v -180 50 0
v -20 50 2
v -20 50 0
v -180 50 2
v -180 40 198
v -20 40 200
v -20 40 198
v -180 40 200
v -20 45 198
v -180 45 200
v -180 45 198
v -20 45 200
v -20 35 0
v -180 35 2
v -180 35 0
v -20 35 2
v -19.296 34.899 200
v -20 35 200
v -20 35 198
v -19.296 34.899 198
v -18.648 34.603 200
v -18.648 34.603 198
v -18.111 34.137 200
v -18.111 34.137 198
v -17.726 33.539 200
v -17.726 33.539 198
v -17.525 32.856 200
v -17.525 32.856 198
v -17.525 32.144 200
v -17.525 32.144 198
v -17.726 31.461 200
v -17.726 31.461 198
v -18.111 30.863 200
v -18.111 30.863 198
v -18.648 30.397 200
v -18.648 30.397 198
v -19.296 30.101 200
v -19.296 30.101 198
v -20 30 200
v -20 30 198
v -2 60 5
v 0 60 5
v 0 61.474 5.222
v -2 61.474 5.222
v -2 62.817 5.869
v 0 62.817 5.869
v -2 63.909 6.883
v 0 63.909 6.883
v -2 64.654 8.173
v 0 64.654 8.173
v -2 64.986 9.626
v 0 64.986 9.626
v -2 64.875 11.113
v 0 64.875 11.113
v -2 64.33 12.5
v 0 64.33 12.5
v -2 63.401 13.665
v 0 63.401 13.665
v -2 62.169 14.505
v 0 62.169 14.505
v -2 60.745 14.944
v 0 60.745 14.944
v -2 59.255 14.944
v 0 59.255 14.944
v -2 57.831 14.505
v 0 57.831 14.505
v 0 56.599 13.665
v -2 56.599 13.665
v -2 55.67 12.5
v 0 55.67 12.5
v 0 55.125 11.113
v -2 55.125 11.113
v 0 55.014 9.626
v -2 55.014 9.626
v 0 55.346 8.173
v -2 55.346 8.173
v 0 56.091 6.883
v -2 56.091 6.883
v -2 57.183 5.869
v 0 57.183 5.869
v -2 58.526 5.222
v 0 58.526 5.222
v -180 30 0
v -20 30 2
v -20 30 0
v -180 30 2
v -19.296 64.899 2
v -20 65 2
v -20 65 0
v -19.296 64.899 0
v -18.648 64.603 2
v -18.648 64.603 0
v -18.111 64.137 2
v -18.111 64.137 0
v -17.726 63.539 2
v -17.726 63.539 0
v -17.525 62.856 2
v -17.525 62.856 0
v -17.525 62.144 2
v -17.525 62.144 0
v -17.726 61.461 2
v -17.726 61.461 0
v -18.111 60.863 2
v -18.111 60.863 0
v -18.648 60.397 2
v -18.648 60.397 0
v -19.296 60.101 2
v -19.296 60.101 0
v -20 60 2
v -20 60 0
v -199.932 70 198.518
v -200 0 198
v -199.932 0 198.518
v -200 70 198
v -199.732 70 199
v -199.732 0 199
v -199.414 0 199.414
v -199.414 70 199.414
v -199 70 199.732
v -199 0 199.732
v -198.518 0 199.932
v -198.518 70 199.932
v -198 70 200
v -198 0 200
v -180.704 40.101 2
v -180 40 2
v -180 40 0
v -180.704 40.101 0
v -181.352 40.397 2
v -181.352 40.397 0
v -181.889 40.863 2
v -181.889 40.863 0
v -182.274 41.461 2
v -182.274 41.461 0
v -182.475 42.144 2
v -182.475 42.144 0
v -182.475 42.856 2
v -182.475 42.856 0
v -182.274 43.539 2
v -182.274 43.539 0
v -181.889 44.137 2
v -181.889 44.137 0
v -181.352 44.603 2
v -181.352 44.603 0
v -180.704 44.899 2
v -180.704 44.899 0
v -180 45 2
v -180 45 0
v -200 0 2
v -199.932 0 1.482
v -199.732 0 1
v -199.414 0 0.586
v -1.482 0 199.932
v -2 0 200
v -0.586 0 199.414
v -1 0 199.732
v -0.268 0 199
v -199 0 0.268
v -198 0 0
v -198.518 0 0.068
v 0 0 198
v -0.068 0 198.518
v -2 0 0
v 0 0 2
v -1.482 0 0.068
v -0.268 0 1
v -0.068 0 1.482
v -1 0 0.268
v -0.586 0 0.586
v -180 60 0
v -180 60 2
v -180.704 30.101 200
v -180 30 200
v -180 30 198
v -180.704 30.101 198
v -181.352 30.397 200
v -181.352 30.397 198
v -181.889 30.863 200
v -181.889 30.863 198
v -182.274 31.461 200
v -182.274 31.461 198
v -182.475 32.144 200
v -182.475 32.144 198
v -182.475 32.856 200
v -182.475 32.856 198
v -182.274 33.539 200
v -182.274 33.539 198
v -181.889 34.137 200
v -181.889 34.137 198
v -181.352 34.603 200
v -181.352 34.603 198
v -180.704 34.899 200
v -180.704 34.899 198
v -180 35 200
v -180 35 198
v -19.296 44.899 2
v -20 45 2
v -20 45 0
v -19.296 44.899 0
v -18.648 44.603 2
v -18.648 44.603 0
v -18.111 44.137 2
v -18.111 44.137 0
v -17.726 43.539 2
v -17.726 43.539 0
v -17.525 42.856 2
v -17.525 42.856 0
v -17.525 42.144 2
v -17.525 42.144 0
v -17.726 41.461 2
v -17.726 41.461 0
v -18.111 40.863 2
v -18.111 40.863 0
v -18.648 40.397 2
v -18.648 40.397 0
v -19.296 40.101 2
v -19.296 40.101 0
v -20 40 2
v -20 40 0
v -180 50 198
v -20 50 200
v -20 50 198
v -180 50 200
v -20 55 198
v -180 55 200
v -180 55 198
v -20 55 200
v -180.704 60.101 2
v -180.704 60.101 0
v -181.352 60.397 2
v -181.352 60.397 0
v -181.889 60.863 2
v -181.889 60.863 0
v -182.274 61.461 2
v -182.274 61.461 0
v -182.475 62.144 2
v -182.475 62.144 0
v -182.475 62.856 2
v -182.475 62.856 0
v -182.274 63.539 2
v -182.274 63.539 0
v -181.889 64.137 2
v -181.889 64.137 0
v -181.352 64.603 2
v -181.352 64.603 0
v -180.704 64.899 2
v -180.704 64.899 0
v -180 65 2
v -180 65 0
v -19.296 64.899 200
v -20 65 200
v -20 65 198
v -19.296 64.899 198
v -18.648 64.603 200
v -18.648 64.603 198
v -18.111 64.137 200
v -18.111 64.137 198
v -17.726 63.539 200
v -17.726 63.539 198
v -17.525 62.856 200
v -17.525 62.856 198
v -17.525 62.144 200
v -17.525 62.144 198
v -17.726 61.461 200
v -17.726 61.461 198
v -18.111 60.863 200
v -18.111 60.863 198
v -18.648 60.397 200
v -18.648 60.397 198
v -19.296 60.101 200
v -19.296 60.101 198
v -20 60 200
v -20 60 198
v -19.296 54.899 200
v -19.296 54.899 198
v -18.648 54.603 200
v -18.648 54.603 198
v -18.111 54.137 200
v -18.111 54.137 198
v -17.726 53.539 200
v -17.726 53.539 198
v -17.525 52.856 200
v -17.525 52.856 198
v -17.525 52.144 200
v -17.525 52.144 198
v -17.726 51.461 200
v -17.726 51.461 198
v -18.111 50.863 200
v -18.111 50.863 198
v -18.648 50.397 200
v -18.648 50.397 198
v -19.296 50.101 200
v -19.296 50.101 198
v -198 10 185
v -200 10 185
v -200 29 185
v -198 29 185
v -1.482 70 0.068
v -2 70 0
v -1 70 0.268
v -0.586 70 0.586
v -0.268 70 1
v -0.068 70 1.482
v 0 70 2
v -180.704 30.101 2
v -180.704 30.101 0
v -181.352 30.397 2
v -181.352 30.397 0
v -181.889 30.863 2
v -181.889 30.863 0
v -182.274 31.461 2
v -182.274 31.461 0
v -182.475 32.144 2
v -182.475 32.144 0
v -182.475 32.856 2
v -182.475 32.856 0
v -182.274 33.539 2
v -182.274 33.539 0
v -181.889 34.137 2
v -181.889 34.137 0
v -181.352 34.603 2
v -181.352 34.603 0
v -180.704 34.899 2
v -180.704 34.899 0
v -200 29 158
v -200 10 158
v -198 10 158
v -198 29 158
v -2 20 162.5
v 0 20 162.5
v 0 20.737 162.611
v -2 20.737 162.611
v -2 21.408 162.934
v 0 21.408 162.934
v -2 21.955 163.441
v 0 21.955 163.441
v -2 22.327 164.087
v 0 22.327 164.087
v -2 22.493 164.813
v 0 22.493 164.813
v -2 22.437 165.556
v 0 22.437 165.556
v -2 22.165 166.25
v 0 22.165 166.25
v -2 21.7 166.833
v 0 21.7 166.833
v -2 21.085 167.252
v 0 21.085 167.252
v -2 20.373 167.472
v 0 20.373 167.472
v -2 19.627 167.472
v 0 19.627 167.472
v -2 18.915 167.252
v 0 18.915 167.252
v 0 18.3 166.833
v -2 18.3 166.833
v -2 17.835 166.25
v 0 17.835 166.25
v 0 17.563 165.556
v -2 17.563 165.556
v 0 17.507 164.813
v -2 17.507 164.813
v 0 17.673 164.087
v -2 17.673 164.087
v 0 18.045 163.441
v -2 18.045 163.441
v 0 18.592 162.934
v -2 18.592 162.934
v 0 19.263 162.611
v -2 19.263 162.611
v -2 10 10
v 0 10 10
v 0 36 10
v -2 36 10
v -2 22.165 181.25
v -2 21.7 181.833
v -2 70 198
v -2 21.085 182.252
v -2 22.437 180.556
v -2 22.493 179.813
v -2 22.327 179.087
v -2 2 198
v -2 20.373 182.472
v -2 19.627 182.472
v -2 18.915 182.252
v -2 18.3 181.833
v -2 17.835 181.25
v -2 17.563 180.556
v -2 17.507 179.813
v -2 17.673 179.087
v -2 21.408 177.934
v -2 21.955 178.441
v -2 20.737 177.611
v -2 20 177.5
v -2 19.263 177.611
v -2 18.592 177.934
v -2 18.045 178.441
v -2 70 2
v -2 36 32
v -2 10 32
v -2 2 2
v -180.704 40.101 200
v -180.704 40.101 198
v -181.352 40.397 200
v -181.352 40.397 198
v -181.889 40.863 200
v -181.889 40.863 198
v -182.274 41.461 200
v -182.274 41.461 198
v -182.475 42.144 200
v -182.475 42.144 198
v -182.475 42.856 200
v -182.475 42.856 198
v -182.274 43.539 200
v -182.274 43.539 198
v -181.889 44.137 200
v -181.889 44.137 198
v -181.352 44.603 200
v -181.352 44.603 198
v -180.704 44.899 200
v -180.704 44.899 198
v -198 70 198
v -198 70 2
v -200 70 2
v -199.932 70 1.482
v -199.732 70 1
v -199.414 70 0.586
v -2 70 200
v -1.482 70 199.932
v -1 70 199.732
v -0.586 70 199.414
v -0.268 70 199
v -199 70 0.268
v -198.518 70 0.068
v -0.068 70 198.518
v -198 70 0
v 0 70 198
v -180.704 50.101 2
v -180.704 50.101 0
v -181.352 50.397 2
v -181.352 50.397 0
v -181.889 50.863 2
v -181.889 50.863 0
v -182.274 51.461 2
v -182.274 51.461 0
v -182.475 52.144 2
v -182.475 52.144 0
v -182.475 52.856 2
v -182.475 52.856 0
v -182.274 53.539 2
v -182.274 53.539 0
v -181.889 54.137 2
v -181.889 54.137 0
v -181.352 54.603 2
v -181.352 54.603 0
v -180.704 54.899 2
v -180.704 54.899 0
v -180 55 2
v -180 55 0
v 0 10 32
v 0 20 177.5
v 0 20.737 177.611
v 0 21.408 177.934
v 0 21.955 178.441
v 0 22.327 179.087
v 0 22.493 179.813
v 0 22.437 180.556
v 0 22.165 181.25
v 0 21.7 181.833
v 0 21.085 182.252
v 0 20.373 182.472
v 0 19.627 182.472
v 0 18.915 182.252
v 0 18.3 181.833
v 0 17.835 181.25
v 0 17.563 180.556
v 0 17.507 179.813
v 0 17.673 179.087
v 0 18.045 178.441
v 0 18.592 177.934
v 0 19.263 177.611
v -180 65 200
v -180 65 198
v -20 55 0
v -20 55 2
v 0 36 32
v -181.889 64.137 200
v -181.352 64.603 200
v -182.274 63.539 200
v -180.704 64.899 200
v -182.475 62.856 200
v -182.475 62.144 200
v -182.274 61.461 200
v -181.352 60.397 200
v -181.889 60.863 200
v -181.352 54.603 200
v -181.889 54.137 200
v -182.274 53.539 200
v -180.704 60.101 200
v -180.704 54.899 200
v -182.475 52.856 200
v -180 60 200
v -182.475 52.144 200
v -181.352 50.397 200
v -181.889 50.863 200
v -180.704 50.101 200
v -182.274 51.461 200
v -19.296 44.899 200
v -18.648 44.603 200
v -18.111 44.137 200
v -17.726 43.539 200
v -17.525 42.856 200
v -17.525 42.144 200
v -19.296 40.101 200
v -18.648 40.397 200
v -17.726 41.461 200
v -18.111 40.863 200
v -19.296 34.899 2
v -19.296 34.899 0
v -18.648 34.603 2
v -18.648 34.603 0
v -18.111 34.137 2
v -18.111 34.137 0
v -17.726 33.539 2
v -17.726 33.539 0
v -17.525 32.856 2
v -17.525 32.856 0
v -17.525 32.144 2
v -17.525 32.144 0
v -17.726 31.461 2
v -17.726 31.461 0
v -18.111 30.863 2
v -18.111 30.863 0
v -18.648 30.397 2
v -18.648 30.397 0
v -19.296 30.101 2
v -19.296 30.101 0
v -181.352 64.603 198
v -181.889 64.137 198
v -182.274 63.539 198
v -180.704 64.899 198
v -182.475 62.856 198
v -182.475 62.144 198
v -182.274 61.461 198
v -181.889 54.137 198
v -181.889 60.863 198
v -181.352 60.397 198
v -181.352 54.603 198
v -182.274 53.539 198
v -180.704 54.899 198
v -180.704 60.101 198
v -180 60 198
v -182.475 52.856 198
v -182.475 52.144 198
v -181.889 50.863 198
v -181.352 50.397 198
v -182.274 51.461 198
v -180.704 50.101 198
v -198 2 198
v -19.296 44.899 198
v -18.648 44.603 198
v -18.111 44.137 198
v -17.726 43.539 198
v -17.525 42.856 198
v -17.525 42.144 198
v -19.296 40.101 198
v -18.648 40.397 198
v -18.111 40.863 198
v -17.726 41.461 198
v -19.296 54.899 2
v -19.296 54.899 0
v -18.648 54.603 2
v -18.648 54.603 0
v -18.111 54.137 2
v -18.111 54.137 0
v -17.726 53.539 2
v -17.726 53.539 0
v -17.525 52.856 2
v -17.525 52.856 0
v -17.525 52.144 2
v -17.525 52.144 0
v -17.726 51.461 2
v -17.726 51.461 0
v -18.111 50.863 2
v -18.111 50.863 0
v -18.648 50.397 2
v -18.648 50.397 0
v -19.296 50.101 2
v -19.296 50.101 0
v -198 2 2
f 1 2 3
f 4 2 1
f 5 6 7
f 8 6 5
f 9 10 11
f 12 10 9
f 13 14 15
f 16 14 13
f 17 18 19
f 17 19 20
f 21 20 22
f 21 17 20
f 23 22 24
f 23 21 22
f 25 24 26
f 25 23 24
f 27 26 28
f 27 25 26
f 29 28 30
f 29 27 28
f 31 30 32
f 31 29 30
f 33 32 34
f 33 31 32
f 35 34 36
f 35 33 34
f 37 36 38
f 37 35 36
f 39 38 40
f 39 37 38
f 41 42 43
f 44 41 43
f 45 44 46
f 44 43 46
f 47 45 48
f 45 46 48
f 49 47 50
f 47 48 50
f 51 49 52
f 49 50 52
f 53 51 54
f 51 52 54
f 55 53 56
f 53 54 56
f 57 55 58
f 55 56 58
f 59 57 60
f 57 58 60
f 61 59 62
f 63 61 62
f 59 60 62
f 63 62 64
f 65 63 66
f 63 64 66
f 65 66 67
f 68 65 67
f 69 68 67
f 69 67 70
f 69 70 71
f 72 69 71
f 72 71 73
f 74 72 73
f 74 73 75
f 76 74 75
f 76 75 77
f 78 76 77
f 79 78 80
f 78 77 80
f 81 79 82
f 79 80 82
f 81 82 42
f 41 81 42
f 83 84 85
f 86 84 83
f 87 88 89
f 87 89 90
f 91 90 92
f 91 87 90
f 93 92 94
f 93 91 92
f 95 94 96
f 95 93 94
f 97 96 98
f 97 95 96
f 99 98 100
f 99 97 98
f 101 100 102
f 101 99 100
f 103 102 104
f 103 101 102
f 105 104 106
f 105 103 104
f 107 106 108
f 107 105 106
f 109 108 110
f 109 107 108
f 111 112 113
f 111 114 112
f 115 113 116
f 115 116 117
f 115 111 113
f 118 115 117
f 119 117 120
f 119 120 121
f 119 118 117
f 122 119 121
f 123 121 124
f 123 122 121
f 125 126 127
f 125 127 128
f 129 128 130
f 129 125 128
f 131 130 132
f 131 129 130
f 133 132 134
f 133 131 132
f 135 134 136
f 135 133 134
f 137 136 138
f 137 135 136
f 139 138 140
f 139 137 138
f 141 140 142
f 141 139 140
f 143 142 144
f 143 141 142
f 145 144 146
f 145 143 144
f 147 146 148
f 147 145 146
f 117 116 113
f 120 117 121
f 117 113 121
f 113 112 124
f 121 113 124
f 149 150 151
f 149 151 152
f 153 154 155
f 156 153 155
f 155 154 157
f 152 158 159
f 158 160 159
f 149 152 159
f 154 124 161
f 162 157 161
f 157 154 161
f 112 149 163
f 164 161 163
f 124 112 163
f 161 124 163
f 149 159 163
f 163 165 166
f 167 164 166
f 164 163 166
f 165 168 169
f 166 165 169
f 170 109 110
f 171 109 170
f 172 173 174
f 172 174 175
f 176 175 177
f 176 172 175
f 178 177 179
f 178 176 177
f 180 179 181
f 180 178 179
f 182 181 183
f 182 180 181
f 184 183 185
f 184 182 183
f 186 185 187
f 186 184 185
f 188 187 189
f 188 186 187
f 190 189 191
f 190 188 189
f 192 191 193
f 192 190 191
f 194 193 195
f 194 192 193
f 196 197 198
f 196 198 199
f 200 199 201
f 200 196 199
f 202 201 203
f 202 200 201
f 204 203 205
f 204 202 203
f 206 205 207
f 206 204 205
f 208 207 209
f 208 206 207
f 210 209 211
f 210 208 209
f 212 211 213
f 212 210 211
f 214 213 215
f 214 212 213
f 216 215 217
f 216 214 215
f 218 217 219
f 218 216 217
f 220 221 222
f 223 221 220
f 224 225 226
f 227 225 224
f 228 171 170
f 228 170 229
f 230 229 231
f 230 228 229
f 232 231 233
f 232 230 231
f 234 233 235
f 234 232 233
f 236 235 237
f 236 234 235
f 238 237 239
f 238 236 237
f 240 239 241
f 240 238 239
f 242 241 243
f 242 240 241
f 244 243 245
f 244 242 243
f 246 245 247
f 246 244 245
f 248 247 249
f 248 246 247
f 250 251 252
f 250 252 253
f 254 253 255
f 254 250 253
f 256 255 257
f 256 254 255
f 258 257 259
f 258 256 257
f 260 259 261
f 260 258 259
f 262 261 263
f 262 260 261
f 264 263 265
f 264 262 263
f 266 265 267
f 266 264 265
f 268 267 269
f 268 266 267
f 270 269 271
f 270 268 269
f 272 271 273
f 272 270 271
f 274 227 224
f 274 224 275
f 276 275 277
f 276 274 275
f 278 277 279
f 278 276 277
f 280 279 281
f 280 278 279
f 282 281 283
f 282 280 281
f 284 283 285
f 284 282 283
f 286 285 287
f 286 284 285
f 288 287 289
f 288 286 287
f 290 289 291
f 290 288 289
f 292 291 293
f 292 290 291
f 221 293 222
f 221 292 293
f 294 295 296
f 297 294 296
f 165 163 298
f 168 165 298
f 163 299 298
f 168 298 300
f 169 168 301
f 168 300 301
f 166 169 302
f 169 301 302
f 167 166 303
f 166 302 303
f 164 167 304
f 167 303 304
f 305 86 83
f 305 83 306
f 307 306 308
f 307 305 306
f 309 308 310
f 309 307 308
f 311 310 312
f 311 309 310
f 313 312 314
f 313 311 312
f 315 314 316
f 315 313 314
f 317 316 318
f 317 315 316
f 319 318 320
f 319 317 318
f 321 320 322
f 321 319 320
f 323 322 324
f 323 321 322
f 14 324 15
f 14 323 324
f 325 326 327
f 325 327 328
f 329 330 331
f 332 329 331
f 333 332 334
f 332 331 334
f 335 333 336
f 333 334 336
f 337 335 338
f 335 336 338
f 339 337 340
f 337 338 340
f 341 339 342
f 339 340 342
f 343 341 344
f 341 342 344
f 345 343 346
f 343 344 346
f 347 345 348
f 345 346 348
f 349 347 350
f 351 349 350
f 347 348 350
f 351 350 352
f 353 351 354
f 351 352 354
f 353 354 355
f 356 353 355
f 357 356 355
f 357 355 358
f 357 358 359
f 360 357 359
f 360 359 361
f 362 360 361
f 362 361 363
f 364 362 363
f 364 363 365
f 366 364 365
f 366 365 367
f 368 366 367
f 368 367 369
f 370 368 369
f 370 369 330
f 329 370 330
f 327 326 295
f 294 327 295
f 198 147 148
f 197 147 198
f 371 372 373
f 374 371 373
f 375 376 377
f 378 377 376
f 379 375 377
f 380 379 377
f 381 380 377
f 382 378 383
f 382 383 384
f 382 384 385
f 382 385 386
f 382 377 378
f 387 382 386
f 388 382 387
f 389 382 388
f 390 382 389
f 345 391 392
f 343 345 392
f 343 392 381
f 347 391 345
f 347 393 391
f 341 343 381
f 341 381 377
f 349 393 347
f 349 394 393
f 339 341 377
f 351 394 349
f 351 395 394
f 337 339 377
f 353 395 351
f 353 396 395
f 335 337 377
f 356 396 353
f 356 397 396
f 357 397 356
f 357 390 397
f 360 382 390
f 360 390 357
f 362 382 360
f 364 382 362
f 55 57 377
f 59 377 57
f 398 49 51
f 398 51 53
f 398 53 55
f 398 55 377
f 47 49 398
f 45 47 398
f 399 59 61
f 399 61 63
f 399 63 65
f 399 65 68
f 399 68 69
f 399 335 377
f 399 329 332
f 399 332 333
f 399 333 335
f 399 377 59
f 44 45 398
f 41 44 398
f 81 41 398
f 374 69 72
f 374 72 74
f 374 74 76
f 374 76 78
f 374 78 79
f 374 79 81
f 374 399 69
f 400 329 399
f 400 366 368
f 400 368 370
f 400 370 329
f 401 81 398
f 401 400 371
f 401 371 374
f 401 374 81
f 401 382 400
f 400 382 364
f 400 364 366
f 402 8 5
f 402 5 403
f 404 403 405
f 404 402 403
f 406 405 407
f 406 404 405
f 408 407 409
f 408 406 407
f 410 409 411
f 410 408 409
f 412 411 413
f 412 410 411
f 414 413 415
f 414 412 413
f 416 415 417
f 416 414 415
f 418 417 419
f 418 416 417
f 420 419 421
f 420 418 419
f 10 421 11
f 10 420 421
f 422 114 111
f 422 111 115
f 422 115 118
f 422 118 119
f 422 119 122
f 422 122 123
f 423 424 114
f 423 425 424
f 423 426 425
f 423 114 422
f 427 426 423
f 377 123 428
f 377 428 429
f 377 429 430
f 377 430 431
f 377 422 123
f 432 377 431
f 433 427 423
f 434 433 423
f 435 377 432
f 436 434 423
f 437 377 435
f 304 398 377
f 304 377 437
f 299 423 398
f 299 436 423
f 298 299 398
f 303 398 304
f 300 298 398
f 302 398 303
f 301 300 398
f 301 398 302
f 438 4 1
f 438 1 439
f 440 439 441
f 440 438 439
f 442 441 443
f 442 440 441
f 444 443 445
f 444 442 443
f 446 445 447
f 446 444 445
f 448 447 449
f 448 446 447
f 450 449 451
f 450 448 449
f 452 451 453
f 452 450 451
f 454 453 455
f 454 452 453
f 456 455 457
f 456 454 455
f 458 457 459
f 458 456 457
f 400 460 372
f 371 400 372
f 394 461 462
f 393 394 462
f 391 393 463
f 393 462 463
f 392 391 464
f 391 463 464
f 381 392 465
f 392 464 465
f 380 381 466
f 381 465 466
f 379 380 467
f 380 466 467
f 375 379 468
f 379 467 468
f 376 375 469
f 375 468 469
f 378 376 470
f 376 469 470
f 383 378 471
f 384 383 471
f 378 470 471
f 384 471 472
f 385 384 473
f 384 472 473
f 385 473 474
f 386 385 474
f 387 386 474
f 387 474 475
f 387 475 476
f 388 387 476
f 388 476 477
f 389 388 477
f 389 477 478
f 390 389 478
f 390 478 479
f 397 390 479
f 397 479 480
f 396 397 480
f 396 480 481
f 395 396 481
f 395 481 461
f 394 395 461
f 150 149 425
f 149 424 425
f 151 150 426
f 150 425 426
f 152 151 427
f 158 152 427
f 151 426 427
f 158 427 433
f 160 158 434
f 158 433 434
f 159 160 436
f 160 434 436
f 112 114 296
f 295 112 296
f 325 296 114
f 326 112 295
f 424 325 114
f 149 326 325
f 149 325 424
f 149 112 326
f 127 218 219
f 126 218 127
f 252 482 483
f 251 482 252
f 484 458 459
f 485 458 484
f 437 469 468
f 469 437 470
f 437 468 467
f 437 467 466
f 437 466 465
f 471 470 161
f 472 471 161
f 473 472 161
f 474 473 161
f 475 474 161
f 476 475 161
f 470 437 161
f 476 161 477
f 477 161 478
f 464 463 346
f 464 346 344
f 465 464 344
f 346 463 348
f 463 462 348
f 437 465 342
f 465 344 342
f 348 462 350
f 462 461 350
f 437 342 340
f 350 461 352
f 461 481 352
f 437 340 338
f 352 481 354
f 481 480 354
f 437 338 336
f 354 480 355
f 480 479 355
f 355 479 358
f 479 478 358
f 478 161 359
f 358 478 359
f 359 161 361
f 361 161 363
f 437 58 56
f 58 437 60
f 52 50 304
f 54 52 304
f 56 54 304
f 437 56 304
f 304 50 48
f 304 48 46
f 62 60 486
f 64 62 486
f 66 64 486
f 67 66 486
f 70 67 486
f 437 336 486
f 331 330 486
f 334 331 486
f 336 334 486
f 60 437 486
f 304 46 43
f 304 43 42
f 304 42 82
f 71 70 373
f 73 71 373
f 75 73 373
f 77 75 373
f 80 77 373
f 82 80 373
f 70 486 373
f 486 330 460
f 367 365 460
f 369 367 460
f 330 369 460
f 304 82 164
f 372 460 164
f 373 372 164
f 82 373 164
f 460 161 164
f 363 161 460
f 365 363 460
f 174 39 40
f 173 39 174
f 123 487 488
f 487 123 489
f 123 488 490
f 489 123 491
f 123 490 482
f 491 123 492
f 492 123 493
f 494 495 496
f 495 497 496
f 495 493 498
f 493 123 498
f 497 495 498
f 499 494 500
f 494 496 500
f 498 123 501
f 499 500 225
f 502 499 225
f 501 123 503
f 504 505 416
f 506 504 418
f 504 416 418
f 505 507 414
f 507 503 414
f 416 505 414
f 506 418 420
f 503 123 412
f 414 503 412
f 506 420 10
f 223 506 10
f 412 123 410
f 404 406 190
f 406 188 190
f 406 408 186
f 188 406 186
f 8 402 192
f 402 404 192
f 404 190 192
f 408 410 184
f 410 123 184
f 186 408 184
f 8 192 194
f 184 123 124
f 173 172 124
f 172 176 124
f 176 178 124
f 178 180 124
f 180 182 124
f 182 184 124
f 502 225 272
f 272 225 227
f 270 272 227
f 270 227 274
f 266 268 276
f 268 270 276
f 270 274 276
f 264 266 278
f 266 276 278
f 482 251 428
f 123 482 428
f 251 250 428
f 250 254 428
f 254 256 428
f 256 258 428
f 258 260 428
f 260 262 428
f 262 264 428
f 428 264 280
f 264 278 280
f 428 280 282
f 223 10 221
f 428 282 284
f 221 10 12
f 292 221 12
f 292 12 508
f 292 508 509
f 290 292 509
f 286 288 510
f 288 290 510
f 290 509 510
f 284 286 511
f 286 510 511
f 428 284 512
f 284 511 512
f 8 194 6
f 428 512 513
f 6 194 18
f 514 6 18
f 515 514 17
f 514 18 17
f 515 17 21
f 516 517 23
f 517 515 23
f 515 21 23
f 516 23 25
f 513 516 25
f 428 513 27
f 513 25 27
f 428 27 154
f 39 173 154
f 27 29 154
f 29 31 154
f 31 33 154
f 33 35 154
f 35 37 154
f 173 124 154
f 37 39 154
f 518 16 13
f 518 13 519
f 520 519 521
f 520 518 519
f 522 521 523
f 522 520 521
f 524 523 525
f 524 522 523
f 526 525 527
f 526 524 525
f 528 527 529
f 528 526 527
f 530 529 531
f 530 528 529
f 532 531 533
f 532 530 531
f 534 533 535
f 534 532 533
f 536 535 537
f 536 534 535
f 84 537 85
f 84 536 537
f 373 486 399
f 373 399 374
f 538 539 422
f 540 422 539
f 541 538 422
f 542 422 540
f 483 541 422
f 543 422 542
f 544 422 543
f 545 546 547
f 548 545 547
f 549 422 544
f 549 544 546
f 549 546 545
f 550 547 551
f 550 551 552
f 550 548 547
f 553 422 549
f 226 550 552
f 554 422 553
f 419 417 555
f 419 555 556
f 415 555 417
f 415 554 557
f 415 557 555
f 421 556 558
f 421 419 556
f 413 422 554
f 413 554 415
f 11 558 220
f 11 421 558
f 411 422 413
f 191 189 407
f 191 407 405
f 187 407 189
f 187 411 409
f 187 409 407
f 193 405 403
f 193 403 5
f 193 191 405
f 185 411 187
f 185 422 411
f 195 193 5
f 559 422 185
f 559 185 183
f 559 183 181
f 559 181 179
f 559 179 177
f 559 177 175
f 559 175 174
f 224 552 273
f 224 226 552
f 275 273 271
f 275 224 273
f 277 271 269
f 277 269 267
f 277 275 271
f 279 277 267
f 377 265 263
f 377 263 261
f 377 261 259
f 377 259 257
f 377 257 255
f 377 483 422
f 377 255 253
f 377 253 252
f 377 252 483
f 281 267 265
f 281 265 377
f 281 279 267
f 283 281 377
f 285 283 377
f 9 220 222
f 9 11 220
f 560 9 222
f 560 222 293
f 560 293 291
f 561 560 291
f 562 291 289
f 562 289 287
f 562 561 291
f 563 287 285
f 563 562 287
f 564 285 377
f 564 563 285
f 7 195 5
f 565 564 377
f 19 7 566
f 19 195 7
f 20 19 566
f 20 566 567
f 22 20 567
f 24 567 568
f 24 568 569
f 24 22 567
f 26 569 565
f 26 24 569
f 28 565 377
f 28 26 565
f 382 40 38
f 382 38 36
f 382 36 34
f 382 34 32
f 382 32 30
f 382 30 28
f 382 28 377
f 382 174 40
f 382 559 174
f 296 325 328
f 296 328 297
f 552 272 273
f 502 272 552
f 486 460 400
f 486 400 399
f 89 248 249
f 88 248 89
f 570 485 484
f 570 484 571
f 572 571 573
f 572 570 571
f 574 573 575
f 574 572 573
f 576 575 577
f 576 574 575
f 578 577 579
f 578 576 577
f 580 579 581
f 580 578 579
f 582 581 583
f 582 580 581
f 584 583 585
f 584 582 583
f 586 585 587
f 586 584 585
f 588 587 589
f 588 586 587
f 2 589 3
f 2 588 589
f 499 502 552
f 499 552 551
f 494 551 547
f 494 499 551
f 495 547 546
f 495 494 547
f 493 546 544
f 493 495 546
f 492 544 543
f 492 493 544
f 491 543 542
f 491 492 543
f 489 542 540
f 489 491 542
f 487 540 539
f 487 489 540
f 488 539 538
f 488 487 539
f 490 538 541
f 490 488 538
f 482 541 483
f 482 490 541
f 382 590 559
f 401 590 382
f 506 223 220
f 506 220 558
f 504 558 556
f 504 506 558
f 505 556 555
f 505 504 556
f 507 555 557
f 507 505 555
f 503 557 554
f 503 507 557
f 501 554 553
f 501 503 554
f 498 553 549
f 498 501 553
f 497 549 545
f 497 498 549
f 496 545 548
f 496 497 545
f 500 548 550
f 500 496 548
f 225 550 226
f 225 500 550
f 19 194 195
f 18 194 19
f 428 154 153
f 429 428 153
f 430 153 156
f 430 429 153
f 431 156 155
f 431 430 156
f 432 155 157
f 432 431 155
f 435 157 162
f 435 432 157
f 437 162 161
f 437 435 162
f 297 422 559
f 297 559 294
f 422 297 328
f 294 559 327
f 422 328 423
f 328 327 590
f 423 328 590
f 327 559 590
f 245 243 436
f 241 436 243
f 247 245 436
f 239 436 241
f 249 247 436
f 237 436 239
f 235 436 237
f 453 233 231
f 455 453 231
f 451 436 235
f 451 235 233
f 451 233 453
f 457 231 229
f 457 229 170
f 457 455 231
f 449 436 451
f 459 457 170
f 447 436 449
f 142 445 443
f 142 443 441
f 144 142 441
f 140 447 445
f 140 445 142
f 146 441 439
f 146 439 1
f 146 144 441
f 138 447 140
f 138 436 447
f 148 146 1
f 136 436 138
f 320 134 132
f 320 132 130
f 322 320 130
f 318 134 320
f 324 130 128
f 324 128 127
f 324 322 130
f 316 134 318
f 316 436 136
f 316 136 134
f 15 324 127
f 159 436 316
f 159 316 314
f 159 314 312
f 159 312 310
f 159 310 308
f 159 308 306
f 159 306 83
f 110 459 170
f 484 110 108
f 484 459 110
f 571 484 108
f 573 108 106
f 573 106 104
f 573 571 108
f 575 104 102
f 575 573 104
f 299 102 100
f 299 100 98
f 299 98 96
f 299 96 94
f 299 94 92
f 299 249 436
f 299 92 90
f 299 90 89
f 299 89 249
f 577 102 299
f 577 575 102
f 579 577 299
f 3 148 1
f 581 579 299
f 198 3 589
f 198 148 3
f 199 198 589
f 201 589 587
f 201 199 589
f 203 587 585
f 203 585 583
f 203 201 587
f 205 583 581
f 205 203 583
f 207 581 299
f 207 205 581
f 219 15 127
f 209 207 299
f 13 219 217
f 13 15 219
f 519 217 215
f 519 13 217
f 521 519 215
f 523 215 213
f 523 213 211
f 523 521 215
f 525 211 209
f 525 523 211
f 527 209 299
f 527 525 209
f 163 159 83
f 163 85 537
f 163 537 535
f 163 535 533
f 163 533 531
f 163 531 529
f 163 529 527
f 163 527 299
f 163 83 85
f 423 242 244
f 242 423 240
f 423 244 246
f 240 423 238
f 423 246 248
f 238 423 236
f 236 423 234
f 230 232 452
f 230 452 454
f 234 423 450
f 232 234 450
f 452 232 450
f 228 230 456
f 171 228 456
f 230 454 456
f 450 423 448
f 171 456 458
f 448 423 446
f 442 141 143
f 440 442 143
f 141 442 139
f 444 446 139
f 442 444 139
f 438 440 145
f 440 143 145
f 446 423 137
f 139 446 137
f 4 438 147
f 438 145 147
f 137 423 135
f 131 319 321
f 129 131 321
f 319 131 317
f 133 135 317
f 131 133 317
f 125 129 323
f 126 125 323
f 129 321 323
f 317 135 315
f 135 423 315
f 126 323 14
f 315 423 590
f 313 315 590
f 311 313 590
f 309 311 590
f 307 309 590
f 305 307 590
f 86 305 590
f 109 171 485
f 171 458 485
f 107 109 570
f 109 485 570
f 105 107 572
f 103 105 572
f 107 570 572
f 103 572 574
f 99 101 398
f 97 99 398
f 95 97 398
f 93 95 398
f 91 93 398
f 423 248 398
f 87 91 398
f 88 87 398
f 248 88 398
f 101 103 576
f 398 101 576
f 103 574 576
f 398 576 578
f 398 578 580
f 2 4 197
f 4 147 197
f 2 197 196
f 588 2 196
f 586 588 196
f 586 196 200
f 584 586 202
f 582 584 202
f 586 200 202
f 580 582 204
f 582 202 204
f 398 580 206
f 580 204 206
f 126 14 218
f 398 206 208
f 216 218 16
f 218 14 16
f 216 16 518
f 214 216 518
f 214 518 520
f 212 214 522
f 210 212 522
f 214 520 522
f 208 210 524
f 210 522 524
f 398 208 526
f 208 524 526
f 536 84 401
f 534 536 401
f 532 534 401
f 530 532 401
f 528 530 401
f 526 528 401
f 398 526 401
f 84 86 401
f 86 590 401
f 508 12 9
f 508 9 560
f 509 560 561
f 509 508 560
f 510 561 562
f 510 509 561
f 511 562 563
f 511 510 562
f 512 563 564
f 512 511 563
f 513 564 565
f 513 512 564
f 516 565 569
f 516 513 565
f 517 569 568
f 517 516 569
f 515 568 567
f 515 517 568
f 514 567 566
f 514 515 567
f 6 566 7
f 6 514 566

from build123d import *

# Parameters (mm, degrees)
SKETCH2_W               = 200
SKETCH2_H               = 200
BOSS_EXTRUDE1_DEPTH     = 70
SHELL2_T                = -2
CUT_EXTRUDE1_DEPTH      = 1
CUT_EXTRUDE1_DEPTH_BACK = 201
SKETCH5_W               = 22
SKETCH5_H               = 26
CUT_EXTRUDE2_DEPTH      = 7
SKETCH6_W               = 27
SKETCH6_H               = 19
CUT_EXTRUDE3_DEPTH      = 7
SKETCH7_R               = 2.5
CUT_EXTRUDE4_DEPTH      = 7
SKETCH8_R               = 5
CUT_EXTRUDE5_DEPTH      = 2
FILLET2_R               = 2


with BuildPart() as part:
    # Sketch2 → Boss-Extrude1 (new body)
    with BuildSketch(Plane(origin=(0, 0, 0), x_dir=(1, 0, 0), z_dir=(0, 1, 0))):
        with Locations((-100, -100)):
            Rectangle(SKETCH2_W, SKETCH2_H)
    extrude(amount=BOSS_EXTRUDE1_DEPTH)

    # Shell2
    shell2_openings = [part.faces().sort_by_distance(p)[0] for p in [
        (-100, 70, 100),
    ]]
    offset(amount=SHELL2_T, openings=shell2_openings, kind=Kind.INTERSECTION)

    # Sketch3 → Cut-Extrude1 (cut, two sides)
    with BuildSketch(Plane.XY.offset(200)) as cut_extrude1_sk:
        with BuildLine():
            Line((-180, 65), (-20, 65))
            ThreePointArc((-20, 65), (-17.5, 62.5), (-20, 60))
            Line((-20, 60), (-180, 60))
            ThreePointArc((-180, 60), (-182.5, 62.5), (-180, 65))
        make_face()
        with BuildLine():
            Line((-180, 55), (-20, 55))
            ThreePointArc((-20, 55), (-17.5, 52.5), (-20, 50))
            Line((-20, 50), (-180, 50))
            ThreePointArc((-180, 50), (-182.5, 52.5), (-180, 55))
        make_face()
        with BuildLine():
            Line((-180, 45), (-20, 45))
            ThreePointArc((-20, 45), (-17.5, 42.5), (-20, 40))
            Line((-20, 40), (-180, 40))
            ThreePointArc((-180, 40), (-182.5, 42.5), (-180, 45))
        make_face()
        with BuildLine():
            Line((-180, 35), (-20, 35))
            ThreePointArc((-20, 35), (-17.5, 32.5), (-20, 30))
            Line((-20, 30), (-180, 30))
            ThreePointArc((-180, 30), (-182.5, 32.5), (-180, 35))
        make_face()
    extrude(amount=CUT_EXTRUDE1_DEPTH, mode=Mode.SUBTRACT)
    extrude(cut_extrude1_sk.sketch, amount=-CUT_EXTRUDE1_DEPTH_BACK, mode=Mode.SUBTRACT)

    # Sketch5 → Cut-Extrude2 (cut)
    with BuildSketch(Plane(origin=(0, 0, 0), x_dir=(0, 0, -1), z_dir=(1, 0, 0))):
        with Locations((-21, 23)):
            Rectangle(SKETCH5_W, SKETCH5_H)
    extrude(amount=-CUT_EXTRUDE2_DEPTH, mode=Mode.SUBTRACT)

    # Sketch6 → Cut-Extrude3 (cut)
    with BuildSketch(Plane.ZY.offset(200)):
        with Locations((171.5, 19.5)):
            Rectangle(SKETCH6_W, SKETCH6_H)
    extrude(amount=-CUT_EXTRUDE3_DEPTH, mode=Mode.SUBTRACT)

    # Sketch7 → Cut-Extrude4 (cut)
    with BuildSketch(Plane(origin=(0, 0, 0), x_dir=(0, 0, -1), z_dir=(1, 0, 0))):
        with Locations((-180, 20)):
            Circle(SKETCH7_R)
        with Locations((-165, 20)):
            Circle(SKETCH7_R)
    extrude(amount=-CUT_EXTRUDE4_DEPTH, mode=Mode.SUBTRACT)

    # Sketch8 → Cut-Extrude5 (cut)
    with BuildSketch(Plane(origin=(0, 0, 0), x_dir=(0, 0, -1), z_dir=(1, 0, 0))):
        with Locations((-10, 60)):
            Circle(SKETCH8_R)
    extrude(amount=-CUT_EXTRUDE5_DEPTH, mode=Mode.SUBTRACT)

    # Fillet2
    fillet2_edges = [part.edges().sort_by_distance(p)[0] for p in [
        (0, 35, 200),
        (-200, 35, 200),
        (-200, 35, 0),
        (0, 35, 0),
    ]]
    fillet(fillet2_edges, radius=FILLET2_R)


solid = part.part
